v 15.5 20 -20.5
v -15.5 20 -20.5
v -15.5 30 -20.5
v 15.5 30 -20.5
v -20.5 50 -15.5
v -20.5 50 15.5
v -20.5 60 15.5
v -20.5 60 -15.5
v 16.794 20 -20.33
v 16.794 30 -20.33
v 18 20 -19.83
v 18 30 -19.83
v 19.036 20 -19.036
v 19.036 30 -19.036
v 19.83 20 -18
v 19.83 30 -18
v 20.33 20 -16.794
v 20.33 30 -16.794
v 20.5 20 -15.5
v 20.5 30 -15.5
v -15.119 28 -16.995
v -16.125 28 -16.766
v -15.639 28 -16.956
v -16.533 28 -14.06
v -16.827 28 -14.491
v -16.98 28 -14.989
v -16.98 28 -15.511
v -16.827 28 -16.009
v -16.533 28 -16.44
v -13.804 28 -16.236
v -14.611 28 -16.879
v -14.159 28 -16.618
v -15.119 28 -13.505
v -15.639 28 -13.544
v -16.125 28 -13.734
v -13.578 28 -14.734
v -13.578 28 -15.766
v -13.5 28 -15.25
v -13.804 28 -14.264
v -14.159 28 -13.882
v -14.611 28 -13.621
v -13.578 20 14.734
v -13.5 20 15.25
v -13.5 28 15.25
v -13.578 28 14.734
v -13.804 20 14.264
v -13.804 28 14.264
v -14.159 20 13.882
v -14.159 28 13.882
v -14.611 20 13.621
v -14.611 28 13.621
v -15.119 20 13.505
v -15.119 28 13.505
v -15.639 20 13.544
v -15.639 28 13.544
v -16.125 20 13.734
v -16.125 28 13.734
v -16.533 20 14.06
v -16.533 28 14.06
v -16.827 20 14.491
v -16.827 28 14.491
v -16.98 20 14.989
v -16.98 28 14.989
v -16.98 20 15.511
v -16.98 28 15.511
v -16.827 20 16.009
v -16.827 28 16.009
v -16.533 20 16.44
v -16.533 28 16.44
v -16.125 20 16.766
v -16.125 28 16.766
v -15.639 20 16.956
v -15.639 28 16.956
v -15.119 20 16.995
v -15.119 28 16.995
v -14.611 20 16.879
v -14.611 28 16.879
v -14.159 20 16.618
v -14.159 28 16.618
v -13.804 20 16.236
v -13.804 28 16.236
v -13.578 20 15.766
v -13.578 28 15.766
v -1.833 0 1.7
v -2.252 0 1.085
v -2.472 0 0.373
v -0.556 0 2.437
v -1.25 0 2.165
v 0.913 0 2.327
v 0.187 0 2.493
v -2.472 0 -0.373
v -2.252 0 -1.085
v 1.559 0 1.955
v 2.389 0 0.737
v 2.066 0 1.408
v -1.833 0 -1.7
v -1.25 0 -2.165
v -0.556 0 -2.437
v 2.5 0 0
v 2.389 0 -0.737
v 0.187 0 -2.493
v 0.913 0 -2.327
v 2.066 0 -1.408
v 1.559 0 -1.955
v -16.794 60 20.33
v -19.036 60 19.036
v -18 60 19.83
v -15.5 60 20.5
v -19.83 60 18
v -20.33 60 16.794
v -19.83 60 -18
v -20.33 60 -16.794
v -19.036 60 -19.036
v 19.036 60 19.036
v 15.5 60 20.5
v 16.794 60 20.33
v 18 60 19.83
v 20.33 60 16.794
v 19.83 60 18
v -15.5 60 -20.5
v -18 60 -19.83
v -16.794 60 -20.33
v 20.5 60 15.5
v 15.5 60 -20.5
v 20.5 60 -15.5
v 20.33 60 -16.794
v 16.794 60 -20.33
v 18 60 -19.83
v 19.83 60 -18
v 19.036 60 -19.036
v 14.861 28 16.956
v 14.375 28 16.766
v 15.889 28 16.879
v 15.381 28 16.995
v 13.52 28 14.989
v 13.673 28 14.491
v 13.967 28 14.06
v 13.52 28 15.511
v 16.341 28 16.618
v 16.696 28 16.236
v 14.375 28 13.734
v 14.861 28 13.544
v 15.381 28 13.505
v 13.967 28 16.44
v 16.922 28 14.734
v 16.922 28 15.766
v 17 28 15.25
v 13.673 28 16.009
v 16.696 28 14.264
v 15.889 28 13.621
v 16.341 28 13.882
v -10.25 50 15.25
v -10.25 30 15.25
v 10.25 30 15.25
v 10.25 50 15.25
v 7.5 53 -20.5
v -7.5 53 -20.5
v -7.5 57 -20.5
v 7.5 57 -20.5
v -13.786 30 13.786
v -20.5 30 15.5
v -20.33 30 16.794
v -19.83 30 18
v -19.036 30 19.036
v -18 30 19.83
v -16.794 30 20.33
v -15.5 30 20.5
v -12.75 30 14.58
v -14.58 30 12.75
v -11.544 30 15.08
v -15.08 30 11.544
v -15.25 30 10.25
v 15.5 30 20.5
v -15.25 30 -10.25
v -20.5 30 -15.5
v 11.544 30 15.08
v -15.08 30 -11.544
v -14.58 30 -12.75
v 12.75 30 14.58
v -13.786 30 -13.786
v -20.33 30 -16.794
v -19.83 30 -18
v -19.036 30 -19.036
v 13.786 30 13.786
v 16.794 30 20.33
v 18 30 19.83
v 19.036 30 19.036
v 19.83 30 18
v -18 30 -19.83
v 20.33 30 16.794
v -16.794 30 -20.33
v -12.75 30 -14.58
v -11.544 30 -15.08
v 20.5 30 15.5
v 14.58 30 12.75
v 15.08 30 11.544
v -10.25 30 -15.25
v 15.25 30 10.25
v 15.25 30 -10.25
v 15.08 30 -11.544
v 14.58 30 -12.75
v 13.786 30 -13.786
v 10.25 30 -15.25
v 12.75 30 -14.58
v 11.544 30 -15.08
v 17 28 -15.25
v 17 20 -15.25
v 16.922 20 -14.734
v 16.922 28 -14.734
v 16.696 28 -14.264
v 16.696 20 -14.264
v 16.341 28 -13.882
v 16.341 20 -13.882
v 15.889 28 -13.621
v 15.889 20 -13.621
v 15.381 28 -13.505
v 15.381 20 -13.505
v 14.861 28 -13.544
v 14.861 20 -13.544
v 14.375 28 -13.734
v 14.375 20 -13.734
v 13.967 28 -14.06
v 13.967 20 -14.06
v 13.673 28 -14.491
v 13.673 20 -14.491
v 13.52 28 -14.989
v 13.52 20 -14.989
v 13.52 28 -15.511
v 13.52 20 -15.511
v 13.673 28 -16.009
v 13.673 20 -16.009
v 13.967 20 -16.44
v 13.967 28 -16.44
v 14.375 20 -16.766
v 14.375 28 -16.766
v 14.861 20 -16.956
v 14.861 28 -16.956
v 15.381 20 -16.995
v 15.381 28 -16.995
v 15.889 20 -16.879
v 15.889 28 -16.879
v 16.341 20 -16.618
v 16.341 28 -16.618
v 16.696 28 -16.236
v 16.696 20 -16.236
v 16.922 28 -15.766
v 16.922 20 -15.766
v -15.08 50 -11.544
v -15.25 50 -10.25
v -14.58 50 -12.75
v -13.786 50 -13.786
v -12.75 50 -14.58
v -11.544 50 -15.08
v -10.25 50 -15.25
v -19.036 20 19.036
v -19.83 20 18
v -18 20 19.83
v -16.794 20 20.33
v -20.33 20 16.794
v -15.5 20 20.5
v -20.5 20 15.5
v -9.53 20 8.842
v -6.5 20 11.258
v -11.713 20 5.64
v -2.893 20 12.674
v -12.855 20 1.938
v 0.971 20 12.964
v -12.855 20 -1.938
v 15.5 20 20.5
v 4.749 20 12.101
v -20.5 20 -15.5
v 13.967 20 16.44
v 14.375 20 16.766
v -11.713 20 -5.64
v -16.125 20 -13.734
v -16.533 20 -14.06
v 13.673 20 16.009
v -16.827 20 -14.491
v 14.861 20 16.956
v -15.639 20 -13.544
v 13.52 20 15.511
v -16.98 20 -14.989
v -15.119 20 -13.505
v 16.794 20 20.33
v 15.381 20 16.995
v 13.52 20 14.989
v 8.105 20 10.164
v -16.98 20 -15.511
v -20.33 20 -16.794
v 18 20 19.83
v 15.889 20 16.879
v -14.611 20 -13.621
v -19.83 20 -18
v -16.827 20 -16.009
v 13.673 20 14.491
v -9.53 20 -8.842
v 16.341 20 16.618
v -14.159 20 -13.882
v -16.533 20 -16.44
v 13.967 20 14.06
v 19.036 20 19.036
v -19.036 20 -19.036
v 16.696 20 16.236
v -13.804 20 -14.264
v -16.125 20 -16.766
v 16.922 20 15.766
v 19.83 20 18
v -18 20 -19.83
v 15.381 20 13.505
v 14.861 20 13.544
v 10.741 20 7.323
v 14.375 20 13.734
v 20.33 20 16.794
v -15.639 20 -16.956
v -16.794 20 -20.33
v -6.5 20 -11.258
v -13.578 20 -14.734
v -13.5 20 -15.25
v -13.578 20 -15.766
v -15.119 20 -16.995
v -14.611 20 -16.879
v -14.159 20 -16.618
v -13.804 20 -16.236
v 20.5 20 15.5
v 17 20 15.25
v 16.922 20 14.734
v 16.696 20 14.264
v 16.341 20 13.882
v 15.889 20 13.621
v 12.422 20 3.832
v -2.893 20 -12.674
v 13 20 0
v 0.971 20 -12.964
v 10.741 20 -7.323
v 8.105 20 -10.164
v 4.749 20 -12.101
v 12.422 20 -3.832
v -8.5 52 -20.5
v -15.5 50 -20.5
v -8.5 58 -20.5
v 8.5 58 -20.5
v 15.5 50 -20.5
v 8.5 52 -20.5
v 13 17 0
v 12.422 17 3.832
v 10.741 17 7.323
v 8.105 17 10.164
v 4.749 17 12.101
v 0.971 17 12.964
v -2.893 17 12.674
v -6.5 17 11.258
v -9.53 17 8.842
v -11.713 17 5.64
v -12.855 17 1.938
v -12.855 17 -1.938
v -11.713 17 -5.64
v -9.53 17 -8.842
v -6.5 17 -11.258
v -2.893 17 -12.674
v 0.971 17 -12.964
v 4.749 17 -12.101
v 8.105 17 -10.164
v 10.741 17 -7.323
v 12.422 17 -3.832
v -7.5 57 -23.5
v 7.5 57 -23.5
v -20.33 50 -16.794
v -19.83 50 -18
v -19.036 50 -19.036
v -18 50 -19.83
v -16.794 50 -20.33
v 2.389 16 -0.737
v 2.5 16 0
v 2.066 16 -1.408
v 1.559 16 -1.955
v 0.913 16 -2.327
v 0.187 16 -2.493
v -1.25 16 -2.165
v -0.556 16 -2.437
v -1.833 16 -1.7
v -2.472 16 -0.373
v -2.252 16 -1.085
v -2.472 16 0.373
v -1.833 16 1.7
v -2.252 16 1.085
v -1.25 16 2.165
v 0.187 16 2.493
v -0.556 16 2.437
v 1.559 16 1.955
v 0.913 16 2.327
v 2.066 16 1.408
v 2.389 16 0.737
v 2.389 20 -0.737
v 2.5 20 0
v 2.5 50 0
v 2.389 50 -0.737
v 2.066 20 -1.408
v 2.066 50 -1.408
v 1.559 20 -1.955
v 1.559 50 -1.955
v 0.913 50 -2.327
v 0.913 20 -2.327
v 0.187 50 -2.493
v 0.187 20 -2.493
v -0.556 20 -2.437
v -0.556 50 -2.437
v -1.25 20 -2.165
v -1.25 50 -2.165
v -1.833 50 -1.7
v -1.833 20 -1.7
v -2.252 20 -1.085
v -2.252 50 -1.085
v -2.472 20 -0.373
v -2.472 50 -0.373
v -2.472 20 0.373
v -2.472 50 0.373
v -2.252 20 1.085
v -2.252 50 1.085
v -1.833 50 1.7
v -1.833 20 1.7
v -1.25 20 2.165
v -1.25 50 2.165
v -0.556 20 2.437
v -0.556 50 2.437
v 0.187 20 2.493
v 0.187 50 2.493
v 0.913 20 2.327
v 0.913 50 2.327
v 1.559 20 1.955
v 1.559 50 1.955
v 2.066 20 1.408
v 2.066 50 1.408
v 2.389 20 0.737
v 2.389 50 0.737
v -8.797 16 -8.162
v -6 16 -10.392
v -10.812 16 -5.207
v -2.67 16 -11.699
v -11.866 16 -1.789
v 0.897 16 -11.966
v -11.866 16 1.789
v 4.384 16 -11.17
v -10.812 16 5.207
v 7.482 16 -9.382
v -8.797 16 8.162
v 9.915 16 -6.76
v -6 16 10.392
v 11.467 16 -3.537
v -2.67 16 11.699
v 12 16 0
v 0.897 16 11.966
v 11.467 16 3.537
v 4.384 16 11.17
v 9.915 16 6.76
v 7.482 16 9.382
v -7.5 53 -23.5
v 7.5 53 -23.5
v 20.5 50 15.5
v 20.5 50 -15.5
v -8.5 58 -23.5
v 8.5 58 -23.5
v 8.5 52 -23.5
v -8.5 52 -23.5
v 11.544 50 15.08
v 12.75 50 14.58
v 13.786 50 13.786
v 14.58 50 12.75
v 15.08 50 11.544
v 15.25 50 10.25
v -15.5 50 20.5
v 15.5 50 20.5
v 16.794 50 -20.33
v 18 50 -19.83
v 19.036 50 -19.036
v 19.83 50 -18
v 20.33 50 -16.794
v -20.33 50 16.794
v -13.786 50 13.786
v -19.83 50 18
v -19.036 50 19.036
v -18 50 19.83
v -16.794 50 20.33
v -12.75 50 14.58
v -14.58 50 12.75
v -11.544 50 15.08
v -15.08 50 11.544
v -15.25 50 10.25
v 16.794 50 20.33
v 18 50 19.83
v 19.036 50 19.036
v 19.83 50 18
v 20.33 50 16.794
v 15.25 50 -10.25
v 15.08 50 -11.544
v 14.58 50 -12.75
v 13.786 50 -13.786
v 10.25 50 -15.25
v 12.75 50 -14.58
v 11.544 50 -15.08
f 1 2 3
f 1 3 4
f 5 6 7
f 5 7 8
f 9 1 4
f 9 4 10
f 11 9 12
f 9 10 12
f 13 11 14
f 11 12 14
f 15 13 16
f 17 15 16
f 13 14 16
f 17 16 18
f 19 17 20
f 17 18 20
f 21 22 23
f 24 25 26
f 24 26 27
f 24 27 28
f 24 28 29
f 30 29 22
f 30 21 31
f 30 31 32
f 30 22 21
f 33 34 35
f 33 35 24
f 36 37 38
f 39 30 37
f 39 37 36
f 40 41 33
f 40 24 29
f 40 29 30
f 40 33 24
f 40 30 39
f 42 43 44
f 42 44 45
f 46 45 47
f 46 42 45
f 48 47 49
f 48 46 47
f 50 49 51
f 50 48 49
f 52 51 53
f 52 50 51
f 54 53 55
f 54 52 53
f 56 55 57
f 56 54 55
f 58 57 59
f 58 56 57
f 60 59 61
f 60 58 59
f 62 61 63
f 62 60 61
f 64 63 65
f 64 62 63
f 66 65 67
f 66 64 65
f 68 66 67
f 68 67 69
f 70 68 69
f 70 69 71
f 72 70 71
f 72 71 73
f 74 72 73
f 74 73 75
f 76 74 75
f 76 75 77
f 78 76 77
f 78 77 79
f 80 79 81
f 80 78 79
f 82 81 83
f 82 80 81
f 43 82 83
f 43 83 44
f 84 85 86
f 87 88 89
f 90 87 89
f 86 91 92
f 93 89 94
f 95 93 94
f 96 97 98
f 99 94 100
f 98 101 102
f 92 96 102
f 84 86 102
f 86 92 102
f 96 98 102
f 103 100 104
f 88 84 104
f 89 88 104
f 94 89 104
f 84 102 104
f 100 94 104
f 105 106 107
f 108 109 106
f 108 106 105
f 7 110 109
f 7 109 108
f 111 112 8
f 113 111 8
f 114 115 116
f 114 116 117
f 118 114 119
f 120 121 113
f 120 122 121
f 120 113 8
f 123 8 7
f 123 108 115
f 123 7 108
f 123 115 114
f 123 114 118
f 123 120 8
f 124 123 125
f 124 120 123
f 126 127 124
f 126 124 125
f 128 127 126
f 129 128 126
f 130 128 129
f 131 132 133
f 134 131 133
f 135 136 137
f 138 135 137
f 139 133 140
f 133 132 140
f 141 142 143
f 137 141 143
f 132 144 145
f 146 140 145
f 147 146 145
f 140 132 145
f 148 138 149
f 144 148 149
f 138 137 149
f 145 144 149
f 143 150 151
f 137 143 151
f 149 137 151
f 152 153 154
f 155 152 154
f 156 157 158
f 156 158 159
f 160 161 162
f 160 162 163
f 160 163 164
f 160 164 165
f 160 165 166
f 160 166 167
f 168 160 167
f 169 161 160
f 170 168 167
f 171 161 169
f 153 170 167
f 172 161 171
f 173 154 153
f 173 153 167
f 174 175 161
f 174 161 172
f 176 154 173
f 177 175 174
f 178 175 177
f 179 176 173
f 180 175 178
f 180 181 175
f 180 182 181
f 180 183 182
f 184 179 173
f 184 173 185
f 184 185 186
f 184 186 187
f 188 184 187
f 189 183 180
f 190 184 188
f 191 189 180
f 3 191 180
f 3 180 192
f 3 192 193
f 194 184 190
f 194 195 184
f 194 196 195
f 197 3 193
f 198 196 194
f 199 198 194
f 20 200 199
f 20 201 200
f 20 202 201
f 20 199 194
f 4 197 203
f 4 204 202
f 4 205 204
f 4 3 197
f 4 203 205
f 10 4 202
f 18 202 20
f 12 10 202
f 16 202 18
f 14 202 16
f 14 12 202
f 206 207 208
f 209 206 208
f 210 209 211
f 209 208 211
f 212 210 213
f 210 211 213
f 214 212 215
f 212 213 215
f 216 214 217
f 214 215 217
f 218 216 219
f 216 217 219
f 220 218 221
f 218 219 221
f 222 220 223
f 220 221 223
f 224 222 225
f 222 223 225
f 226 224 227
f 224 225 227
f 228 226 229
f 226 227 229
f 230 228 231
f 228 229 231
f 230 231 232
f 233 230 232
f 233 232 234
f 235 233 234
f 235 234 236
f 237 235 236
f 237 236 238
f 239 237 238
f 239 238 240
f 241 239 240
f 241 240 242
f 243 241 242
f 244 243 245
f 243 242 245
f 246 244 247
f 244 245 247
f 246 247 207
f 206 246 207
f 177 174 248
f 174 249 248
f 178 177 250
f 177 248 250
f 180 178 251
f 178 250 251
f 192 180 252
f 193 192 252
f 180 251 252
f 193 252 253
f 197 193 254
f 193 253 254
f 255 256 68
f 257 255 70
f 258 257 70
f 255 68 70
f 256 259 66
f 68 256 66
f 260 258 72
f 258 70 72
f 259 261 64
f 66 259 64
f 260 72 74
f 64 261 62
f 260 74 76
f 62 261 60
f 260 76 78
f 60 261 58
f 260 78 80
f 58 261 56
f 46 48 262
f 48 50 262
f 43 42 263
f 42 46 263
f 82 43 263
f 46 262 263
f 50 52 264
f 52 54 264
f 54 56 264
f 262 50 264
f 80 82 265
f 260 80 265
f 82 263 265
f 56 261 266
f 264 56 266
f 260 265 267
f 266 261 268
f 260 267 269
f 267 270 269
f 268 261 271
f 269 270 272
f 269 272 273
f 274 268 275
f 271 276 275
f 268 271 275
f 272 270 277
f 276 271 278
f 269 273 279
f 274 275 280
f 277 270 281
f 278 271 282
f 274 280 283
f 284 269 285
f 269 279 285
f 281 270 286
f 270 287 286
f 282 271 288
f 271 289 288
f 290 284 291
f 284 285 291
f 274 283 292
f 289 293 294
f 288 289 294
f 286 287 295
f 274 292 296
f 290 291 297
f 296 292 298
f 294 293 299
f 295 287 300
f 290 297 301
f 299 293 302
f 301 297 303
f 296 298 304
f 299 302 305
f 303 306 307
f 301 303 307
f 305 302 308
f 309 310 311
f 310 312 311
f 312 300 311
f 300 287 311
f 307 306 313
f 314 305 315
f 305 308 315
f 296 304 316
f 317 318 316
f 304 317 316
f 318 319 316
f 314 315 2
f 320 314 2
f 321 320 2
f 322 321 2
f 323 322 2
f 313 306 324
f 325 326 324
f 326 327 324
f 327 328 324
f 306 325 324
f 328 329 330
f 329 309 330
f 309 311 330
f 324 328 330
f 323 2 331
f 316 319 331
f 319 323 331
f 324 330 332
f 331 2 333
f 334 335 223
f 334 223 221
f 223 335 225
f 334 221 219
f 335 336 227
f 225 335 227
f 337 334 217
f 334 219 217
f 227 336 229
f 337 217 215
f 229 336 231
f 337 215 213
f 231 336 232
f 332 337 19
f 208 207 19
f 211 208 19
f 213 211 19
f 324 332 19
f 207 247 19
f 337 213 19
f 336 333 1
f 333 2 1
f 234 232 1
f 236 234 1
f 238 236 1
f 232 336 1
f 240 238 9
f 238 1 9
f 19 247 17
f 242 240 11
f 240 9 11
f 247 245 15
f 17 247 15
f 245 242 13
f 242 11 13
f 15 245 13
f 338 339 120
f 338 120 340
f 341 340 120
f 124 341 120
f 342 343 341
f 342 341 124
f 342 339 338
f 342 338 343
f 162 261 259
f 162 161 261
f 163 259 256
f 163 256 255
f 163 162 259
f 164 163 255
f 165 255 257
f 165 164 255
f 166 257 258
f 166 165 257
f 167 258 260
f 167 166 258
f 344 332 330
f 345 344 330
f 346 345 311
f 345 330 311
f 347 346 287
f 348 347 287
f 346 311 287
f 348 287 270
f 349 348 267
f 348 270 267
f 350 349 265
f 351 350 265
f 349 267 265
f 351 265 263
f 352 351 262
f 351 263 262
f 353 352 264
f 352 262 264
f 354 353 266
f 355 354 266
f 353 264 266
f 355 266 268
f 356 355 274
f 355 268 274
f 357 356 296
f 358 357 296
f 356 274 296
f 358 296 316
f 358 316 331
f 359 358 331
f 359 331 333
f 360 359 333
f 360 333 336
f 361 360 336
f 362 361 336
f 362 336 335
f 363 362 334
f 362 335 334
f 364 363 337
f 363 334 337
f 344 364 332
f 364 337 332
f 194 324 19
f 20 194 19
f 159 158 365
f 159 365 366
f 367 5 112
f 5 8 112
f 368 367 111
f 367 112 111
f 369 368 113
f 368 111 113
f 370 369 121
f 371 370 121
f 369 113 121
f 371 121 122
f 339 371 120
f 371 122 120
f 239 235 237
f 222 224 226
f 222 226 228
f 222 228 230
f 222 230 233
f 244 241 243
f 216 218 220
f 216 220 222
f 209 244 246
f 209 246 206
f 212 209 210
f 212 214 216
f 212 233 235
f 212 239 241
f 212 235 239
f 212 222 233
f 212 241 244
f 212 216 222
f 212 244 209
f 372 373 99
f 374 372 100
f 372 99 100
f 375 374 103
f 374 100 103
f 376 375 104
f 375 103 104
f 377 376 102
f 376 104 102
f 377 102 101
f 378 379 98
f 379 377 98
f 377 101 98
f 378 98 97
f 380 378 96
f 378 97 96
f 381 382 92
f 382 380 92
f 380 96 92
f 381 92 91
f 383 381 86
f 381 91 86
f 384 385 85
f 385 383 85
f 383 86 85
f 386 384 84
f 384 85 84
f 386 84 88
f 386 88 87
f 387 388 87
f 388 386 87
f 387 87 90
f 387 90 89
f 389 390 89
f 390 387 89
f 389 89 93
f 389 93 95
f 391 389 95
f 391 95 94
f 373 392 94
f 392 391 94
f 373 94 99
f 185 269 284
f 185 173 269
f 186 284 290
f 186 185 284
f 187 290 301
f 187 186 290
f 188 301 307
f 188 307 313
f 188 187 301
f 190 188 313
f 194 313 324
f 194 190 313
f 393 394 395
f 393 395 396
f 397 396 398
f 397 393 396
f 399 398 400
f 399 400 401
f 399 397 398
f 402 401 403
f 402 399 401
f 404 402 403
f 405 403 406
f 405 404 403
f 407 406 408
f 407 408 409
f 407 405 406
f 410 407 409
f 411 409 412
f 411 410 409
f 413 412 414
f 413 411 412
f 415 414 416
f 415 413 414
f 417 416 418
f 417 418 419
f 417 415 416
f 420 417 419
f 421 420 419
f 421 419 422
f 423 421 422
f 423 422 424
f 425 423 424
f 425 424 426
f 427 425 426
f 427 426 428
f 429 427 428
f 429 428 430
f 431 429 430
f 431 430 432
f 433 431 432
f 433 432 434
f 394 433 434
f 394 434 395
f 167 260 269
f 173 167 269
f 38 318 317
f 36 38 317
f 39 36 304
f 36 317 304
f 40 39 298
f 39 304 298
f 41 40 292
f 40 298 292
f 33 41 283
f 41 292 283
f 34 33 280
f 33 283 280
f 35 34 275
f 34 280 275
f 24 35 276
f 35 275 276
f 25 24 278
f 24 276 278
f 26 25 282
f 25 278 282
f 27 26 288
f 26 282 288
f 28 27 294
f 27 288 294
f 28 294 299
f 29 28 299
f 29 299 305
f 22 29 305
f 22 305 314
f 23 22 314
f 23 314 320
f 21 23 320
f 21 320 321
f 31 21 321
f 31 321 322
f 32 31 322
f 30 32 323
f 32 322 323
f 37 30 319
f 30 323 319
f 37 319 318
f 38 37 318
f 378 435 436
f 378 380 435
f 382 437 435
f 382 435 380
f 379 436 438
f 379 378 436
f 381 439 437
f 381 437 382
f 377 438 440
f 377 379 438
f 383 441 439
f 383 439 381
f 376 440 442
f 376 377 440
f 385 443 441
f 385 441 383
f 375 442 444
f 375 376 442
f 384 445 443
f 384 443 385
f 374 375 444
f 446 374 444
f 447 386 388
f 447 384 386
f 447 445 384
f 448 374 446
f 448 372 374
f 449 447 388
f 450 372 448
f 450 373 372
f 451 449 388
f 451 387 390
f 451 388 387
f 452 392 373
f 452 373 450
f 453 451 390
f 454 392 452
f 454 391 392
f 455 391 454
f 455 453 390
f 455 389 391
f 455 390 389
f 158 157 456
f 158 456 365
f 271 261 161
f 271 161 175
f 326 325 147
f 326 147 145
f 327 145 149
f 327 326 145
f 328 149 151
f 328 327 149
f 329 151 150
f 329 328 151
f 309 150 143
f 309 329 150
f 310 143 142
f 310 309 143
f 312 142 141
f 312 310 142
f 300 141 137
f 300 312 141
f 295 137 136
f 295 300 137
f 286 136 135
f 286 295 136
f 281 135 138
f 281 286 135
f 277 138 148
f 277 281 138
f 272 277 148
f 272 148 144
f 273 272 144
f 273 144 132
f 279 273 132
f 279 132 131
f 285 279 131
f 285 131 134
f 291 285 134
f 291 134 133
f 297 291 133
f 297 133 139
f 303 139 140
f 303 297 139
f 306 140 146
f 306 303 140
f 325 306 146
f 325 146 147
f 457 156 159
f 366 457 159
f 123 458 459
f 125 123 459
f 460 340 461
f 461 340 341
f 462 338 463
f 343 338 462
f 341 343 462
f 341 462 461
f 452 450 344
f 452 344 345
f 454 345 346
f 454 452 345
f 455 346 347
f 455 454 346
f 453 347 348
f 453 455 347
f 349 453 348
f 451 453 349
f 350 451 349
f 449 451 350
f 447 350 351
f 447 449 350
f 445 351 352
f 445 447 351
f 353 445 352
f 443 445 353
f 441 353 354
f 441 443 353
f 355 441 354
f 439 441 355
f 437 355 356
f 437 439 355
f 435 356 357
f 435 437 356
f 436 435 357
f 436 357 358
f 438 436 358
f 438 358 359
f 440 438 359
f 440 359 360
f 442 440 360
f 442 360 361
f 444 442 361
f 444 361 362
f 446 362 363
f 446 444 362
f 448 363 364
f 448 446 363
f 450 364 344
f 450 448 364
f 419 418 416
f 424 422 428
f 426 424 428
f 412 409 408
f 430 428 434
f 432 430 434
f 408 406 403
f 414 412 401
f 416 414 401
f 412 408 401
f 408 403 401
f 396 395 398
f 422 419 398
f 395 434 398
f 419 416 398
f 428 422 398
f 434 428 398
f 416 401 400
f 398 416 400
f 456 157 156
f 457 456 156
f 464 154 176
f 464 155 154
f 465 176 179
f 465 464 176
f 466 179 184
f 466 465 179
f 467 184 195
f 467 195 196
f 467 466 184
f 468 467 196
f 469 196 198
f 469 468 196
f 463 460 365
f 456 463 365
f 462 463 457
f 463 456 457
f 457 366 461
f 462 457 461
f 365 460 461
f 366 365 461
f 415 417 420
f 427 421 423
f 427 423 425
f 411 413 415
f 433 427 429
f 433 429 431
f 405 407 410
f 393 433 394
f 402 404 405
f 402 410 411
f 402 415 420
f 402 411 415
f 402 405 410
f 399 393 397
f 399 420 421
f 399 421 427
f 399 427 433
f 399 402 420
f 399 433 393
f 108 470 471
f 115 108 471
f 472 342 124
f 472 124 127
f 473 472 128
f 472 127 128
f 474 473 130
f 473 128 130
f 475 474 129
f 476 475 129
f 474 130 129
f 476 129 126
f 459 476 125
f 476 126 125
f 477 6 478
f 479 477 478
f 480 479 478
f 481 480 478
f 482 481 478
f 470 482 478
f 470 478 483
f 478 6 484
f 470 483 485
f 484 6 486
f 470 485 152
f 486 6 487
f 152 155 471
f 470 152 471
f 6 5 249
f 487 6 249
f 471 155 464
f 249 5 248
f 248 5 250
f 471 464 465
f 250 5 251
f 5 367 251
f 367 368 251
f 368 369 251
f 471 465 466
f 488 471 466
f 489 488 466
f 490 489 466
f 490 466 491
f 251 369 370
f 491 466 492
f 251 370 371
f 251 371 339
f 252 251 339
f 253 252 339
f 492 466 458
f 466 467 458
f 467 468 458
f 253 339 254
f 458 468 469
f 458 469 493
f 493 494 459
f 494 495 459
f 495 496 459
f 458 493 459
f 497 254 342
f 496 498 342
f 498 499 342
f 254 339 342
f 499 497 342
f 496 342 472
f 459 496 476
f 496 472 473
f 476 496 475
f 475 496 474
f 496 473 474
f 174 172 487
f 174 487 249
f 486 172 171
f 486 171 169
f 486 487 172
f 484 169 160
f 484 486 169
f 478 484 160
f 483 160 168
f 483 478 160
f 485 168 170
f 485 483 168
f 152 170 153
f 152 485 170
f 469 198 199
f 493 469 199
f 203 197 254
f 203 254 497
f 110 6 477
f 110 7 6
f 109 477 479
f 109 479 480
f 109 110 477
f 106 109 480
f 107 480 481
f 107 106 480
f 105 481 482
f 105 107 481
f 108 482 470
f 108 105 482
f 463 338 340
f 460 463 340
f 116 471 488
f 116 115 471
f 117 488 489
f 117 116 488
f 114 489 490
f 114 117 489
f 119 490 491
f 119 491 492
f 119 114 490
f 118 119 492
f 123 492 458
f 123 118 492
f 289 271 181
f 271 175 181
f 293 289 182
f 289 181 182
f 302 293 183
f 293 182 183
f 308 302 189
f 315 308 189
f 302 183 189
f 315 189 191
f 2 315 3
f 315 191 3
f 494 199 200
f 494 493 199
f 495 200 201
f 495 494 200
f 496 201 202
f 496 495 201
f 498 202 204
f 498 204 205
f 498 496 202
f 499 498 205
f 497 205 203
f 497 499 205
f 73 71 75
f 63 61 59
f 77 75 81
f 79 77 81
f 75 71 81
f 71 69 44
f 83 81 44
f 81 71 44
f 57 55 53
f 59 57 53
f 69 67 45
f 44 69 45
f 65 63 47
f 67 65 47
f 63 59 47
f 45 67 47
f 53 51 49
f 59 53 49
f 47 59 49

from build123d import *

# Parameters (mm, degrees)
SKETCH1_R           = 2.5
BOSS_EXTRUDE1_DEPTH = 20
BOSS_EXTRUDE2_START = 20
SKETCH1_3_W         = 41
SKETCH1_3_H         = 41
SKETCH1_3_R         = 2.5
BOSS_EXTRUDE2_DEPTH = 10
BOSS_EXTRUDE3_START = 20
SKETCH1_4_W         = 30.5
SKETCH1_4_H         = 30.5
SKETCH1_4_R         = 2.5
BOSS_EXTRUDE3_DEPTH = 30
BOSS_EXTRUDE4_START = 50
SKETCH1_5_W         = 41
SKETCH1_5_H         = 41
BOSS_EXTRUDE4_DEPTH = 10
FILLET1_R           = 5
SKETCH2_R           = 1.75
CUT_EXTRUDE1_DEPTH  = 8
SKETCH3_R           = 13
BOSS_EXTRUDE5_DEPTH = 4
CHAMFER1_SIZE       = 1
SKETCH4_W           = 17
SKETCH4_H           = 6
SKETCH4_W_2         = 15
SKETCH4_H_2         = 4
EXTRUDE_THIN1_DEPTH = 3


with BuildPart() as part:
    # Sketch1 → Boss-Extrude1 (new body)
    with BuildSketch(Plane(origin=(0, 0, 0), x_dir=(1, 0, 0), z_dir=(0, 1, 0))):
        Circle(SKETCH1_R)
    extrude(amount=BOSS_EXTRUDE1_DEPTH)



with BuildPart() as body_2:
    # Sketch1<3> → Boss-Extrude2 (new body)
    with BuildSketch(Plane(origin=(0, 0, 0), x_dir=(1, 0, 0), z_dir=(0, 1, 0)).offset(BOSS_EXTRUDE2_START)):
        Rectangle(SKETCH1_3_W, SKETCH1_3_H)
        Circle(SKETCH1_3_R, mode=Mode.SUBTRACT)
    extrude(amount=BOSS_EXTRUDE2_DEPTH)

    # Sketch1<4> → Boss-Extrude3 (add)
    with BuildSketch(Plane(origin=(0, 0, 0), x_dir=(1, 0, 0), z_dir=(0, 1, 0)).offset(BOSS_EXTRUDE3_START)):
        Rectangle(SKETCH1_4_W, SKETCH1_4_H)
        Circle(SKETCH1_4_R, mode=Mode.SUBTRACT)
    extrude(amount=BOSS_EXTRUDE3_DEPTH)

    # Sketch1<5> → Boss-Extrude4 (add)
    with BuildSketch(Plane(origin=(0, 0, 0), x_dir=(1, 0, 0), z_dir=(0, 1, 0)).offset(BOSS_EXTRUDE4_START)):
        Rectangle(SKETCH1_5_W, SKETCH1_5_H)
    extrude(amount=BOSS_EXTRUDE4_DEPTH)

    # Fillet1
    fillet1_edges = [body_2.edges().sort_by_distance(p)[0] for p in [
        (-20.5, 25, -20.5),
        (20.5, 25, -20.5),
        (20.5, 25, 20.5),
        (-20.5, 25, 20.5),
        (15.25, 40, -15.25),
        (15.25, 40, 15.25),
        (-15.25, 40, 15.25),
        (-15.25, 40, -15.25),
        (-20.5, 55, -20.5),
        (-20.5, 55, 20.5),
        (20.5, 55, 20.5),
        (20.5, 55, -20.5),
    ]]
    fillet(fillet1_edges, radius=FILLET1_R)

    # Sketch2 → Cut-Extrude1 (cut)
    with BuildSketch(Plane.XZ.offset(-20)):
        with Locations((15.25, -15.25)):
            Circle(SKETCH2_R)
        with Locations((-15.25, -15.25)):
            Circle(SKETCH2_R)
    cut_extrude1 = extrude(amount=-CUT_EXTRUDE1_DEPTH, mode=Mode.SUBTRACT)

    # Mirror1: Cut-Extrude1 across plane
    add(cut_extrude1.mirror(Plane.XY), mode=Mode.SUBTRACT)


with BuildPart() as part_1:
    add(part.part)

    add(body_2.part)  # Boss-Extrude5 merges body 2
    # Sketch3 → Boss-Extrude5 (add)
    with BuildSketch(Plane.XZ.offset(-20)):
        Circle(SKETCH3_R)
    extrude(amount=BOSS_EXTRUDE5_DEPTH)

    # Chamfer1
    chamfer1_edges = [part_1.edges().sort_by_distance(p)[0] for p in [
        (-13, 16, 0),
    ]]
    chamfer(chamfer1_edges, length=CHAMFER1_SIZE)

    # Sketch4 → Extrude-Thin1 (add)
    with BuildSketch(Plane.XY.offset(-20.5)):
        with Locations((0, 55)):
            Rectangle(SKETCH4_W, SKETCH4_H)
        with Locations((0, 55)):
            Rectangle(SKETCH4_W_2, SKETCH4_H_2, mode=Mode.SUBTRACT)
    extrude(amount=-EXTRUDE_THIN1_DEPTH)


solid = part_1.part
